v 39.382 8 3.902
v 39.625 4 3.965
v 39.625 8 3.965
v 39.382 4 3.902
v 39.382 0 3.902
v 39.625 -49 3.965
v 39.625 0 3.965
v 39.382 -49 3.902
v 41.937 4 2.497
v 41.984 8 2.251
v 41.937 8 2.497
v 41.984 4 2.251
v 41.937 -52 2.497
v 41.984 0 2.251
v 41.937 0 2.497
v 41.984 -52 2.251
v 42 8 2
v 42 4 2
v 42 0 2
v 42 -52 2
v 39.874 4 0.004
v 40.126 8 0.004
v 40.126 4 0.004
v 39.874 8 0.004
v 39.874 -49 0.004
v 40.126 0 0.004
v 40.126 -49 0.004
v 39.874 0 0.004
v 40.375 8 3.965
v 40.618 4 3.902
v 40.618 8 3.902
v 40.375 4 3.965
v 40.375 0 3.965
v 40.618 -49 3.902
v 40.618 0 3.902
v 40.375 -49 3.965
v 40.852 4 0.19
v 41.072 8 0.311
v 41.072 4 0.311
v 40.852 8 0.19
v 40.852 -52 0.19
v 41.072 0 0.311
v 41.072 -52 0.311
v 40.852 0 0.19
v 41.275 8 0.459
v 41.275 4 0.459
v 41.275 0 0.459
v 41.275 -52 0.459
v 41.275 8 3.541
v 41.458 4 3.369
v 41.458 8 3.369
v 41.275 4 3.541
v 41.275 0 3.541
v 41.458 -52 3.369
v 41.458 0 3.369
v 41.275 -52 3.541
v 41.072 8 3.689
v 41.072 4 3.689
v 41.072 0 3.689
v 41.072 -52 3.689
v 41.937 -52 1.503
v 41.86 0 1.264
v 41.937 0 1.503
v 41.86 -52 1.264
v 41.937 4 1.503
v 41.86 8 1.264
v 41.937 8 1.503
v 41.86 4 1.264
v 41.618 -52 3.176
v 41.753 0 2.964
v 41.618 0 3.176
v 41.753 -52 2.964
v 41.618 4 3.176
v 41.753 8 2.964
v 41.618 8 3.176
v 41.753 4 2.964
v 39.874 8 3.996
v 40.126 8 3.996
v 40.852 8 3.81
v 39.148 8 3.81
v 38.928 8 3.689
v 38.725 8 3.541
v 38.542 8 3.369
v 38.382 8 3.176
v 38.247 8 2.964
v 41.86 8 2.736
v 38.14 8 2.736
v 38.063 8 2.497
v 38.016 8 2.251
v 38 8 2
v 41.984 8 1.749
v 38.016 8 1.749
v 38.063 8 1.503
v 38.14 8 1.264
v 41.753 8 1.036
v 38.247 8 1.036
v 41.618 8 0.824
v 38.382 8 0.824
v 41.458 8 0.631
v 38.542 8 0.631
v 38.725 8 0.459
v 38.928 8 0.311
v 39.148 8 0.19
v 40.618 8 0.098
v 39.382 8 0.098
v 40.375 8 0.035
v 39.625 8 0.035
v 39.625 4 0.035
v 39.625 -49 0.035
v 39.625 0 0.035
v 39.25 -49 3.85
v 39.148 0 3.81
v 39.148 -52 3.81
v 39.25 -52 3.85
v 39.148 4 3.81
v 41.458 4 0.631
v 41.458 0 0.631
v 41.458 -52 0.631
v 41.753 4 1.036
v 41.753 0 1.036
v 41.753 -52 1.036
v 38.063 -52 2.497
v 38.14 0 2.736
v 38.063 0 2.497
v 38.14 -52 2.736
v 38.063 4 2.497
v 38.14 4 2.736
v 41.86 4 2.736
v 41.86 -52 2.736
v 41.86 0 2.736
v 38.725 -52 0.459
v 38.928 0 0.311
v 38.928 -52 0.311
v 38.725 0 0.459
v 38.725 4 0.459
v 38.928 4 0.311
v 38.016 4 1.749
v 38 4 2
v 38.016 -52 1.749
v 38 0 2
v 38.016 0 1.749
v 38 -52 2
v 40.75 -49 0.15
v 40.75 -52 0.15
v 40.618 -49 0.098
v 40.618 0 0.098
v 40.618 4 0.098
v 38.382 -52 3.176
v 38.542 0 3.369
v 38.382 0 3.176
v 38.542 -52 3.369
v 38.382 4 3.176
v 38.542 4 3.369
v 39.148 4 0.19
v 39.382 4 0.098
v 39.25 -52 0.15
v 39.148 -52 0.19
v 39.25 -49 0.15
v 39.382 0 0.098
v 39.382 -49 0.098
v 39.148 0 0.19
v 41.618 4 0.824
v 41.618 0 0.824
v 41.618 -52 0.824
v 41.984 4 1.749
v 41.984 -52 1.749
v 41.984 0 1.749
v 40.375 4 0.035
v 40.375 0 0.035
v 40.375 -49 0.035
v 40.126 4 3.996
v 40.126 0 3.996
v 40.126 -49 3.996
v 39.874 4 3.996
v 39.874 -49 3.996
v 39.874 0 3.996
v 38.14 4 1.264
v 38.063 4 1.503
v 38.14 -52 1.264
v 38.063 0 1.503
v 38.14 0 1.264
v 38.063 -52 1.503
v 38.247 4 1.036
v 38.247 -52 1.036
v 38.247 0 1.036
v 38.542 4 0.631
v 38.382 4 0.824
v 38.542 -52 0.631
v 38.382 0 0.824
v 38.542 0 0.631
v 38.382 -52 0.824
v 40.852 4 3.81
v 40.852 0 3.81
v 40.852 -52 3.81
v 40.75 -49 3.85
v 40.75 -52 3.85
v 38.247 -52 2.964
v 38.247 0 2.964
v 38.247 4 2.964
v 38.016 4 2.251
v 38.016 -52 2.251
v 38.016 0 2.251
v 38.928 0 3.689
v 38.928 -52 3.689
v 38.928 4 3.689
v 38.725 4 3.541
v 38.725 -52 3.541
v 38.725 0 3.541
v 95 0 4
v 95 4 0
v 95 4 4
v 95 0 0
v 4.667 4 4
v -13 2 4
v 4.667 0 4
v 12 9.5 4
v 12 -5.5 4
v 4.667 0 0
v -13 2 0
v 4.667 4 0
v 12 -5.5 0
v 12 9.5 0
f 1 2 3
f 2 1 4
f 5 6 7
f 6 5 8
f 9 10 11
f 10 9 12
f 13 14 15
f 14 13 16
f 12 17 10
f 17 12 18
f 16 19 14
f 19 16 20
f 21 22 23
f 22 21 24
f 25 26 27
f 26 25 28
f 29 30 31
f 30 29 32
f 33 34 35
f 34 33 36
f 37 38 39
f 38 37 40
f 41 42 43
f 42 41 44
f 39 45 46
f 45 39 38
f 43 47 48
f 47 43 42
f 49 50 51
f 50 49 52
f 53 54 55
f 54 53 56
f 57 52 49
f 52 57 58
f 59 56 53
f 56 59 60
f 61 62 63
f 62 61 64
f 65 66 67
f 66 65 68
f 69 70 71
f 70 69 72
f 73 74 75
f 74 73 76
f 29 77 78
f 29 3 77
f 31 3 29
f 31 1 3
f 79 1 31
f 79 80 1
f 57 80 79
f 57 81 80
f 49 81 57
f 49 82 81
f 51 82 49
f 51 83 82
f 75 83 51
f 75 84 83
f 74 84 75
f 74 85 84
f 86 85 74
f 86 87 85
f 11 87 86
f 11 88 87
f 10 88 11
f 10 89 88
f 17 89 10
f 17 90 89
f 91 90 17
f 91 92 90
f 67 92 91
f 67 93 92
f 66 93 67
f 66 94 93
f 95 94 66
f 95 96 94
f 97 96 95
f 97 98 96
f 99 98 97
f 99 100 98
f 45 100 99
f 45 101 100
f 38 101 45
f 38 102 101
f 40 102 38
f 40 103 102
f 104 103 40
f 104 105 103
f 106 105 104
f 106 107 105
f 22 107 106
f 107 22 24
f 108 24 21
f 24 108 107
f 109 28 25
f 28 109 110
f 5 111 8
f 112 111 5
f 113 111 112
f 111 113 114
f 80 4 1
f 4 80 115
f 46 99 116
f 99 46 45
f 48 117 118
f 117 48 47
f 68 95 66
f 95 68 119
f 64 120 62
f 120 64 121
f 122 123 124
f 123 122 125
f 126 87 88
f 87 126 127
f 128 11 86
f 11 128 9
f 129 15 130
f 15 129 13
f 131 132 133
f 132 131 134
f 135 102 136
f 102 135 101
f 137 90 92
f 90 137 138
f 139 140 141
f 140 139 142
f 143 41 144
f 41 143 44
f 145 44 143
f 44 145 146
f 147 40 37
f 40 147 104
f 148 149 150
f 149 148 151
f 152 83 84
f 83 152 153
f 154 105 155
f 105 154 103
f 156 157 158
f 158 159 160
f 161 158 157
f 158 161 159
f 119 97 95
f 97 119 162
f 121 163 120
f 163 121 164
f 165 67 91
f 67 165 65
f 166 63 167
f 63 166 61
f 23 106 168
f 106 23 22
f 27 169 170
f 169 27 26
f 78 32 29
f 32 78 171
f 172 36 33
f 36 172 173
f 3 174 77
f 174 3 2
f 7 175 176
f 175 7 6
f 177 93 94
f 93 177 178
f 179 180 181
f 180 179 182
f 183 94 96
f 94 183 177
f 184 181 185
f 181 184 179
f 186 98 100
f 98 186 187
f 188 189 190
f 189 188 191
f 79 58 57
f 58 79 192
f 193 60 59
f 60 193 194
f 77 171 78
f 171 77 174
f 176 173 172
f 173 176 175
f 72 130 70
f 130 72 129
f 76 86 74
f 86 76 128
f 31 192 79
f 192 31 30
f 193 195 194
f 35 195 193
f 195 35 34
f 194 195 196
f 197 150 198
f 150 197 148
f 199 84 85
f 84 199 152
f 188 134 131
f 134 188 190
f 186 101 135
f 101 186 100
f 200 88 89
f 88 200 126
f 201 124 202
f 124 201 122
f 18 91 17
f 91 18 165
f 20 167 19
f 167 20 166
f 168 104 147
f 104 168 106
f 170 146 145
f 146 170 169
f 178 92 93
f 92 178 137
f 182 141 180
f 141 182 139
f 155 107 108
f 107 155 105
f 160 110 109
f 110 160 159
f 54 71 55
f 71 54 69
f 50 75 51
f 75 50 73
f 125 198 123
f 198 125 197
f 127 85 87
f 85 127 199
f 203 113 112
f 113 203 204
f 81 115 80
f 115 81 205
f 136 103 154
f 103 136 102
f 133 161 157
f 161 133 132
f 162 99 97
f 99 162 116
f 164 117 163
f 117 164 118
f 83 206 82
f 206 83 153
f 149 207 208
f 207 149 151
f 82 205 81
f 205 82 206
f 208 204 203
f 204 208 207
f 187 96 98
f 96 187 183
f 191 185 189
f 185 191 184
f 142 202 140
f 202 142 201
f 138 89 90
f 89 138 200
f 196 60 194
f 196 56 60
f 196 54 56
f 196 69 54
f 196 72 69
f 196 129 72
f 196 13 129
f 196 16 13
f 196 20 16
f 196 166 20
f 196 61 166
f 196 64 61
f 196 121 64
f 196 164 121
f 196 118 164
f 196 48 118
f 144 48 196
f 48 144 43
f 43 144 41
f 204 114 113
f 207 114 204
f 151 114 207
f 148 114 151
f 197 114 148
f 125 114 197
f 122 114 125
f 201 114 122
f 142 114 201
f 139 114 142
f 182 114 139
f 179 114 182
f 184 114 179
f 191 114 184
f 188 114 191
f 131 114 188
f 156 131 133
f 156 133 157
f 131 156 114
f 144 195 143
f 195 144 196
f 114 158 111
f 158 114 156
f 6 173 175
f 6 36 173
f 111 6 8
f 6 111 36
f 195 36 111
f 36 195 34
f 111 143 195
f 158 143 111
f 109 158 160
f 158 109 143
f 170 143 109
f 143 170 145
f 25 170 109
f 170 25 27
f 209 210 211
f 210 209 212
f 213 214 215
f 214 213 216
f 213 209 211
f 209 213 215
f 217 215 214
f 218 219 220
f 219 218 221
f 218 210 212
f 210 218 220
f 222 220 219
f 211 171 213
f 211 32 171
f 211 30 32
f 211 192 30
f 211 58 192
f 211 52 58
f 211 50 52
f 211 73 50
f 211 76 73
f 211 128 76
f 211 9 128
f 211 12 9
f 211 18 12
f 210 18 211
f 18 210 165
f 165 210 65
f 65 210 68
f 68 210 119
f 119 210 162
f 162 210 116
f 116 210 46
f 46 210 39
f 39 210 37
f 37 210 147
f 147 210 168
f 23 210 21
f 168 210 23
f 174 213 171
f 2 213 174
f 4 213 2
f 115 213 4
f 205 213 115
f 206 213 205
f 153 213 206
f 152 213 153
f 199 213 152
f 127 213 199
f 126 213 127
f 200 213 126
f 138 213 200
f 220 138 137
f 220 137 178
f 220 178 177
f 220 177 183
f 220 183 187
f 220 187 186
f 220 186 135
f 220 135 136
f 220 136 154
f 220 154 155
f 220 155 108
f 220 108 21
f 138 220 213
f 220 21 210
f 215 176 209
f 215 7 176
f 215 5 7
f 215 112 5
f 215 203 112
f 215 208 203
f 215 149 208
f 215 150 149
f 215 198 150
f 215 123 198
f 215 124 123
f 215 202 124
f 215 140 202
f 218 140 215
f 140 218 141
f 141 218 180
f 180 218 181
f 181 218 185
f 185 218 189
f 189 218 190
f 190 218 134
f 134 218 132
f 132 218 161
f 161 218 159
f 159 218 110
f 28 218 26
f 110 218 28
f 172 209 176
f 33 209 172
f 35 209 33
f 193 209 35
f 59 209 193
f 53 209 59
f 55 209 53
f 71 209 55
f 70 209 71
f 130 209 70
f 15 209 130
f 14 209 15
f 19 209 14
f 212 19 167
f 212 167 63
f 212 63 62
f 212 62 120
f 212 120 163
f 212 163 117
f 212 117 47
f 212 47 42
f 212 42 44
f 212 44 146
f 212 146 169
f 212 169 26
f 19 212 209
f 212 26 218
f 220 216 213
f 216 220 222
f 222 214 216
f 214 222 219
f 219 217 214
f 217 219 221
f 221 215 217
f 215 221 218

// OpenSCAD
$fn=50;
union() {
	translate([-32,-47,0]) resize([100,0,0],auto=true) linear_extrude(5) import ("/Users/rmd/Documents/rooster.dxf");
	difference() {
		translate([40,8,2]) rotate([90,0,0]) cylinder(d=4,h=60);
		translate([39.25,-52,0]) cube([1.5,3,4]);
	}
	cube([95,4,4]);
	translate([12,-5.5,0]) linear_extrude(4) polygon(points=[[0,0],[-25,7.5],[0,15],[-10,7.5],[0,0]]);
}
